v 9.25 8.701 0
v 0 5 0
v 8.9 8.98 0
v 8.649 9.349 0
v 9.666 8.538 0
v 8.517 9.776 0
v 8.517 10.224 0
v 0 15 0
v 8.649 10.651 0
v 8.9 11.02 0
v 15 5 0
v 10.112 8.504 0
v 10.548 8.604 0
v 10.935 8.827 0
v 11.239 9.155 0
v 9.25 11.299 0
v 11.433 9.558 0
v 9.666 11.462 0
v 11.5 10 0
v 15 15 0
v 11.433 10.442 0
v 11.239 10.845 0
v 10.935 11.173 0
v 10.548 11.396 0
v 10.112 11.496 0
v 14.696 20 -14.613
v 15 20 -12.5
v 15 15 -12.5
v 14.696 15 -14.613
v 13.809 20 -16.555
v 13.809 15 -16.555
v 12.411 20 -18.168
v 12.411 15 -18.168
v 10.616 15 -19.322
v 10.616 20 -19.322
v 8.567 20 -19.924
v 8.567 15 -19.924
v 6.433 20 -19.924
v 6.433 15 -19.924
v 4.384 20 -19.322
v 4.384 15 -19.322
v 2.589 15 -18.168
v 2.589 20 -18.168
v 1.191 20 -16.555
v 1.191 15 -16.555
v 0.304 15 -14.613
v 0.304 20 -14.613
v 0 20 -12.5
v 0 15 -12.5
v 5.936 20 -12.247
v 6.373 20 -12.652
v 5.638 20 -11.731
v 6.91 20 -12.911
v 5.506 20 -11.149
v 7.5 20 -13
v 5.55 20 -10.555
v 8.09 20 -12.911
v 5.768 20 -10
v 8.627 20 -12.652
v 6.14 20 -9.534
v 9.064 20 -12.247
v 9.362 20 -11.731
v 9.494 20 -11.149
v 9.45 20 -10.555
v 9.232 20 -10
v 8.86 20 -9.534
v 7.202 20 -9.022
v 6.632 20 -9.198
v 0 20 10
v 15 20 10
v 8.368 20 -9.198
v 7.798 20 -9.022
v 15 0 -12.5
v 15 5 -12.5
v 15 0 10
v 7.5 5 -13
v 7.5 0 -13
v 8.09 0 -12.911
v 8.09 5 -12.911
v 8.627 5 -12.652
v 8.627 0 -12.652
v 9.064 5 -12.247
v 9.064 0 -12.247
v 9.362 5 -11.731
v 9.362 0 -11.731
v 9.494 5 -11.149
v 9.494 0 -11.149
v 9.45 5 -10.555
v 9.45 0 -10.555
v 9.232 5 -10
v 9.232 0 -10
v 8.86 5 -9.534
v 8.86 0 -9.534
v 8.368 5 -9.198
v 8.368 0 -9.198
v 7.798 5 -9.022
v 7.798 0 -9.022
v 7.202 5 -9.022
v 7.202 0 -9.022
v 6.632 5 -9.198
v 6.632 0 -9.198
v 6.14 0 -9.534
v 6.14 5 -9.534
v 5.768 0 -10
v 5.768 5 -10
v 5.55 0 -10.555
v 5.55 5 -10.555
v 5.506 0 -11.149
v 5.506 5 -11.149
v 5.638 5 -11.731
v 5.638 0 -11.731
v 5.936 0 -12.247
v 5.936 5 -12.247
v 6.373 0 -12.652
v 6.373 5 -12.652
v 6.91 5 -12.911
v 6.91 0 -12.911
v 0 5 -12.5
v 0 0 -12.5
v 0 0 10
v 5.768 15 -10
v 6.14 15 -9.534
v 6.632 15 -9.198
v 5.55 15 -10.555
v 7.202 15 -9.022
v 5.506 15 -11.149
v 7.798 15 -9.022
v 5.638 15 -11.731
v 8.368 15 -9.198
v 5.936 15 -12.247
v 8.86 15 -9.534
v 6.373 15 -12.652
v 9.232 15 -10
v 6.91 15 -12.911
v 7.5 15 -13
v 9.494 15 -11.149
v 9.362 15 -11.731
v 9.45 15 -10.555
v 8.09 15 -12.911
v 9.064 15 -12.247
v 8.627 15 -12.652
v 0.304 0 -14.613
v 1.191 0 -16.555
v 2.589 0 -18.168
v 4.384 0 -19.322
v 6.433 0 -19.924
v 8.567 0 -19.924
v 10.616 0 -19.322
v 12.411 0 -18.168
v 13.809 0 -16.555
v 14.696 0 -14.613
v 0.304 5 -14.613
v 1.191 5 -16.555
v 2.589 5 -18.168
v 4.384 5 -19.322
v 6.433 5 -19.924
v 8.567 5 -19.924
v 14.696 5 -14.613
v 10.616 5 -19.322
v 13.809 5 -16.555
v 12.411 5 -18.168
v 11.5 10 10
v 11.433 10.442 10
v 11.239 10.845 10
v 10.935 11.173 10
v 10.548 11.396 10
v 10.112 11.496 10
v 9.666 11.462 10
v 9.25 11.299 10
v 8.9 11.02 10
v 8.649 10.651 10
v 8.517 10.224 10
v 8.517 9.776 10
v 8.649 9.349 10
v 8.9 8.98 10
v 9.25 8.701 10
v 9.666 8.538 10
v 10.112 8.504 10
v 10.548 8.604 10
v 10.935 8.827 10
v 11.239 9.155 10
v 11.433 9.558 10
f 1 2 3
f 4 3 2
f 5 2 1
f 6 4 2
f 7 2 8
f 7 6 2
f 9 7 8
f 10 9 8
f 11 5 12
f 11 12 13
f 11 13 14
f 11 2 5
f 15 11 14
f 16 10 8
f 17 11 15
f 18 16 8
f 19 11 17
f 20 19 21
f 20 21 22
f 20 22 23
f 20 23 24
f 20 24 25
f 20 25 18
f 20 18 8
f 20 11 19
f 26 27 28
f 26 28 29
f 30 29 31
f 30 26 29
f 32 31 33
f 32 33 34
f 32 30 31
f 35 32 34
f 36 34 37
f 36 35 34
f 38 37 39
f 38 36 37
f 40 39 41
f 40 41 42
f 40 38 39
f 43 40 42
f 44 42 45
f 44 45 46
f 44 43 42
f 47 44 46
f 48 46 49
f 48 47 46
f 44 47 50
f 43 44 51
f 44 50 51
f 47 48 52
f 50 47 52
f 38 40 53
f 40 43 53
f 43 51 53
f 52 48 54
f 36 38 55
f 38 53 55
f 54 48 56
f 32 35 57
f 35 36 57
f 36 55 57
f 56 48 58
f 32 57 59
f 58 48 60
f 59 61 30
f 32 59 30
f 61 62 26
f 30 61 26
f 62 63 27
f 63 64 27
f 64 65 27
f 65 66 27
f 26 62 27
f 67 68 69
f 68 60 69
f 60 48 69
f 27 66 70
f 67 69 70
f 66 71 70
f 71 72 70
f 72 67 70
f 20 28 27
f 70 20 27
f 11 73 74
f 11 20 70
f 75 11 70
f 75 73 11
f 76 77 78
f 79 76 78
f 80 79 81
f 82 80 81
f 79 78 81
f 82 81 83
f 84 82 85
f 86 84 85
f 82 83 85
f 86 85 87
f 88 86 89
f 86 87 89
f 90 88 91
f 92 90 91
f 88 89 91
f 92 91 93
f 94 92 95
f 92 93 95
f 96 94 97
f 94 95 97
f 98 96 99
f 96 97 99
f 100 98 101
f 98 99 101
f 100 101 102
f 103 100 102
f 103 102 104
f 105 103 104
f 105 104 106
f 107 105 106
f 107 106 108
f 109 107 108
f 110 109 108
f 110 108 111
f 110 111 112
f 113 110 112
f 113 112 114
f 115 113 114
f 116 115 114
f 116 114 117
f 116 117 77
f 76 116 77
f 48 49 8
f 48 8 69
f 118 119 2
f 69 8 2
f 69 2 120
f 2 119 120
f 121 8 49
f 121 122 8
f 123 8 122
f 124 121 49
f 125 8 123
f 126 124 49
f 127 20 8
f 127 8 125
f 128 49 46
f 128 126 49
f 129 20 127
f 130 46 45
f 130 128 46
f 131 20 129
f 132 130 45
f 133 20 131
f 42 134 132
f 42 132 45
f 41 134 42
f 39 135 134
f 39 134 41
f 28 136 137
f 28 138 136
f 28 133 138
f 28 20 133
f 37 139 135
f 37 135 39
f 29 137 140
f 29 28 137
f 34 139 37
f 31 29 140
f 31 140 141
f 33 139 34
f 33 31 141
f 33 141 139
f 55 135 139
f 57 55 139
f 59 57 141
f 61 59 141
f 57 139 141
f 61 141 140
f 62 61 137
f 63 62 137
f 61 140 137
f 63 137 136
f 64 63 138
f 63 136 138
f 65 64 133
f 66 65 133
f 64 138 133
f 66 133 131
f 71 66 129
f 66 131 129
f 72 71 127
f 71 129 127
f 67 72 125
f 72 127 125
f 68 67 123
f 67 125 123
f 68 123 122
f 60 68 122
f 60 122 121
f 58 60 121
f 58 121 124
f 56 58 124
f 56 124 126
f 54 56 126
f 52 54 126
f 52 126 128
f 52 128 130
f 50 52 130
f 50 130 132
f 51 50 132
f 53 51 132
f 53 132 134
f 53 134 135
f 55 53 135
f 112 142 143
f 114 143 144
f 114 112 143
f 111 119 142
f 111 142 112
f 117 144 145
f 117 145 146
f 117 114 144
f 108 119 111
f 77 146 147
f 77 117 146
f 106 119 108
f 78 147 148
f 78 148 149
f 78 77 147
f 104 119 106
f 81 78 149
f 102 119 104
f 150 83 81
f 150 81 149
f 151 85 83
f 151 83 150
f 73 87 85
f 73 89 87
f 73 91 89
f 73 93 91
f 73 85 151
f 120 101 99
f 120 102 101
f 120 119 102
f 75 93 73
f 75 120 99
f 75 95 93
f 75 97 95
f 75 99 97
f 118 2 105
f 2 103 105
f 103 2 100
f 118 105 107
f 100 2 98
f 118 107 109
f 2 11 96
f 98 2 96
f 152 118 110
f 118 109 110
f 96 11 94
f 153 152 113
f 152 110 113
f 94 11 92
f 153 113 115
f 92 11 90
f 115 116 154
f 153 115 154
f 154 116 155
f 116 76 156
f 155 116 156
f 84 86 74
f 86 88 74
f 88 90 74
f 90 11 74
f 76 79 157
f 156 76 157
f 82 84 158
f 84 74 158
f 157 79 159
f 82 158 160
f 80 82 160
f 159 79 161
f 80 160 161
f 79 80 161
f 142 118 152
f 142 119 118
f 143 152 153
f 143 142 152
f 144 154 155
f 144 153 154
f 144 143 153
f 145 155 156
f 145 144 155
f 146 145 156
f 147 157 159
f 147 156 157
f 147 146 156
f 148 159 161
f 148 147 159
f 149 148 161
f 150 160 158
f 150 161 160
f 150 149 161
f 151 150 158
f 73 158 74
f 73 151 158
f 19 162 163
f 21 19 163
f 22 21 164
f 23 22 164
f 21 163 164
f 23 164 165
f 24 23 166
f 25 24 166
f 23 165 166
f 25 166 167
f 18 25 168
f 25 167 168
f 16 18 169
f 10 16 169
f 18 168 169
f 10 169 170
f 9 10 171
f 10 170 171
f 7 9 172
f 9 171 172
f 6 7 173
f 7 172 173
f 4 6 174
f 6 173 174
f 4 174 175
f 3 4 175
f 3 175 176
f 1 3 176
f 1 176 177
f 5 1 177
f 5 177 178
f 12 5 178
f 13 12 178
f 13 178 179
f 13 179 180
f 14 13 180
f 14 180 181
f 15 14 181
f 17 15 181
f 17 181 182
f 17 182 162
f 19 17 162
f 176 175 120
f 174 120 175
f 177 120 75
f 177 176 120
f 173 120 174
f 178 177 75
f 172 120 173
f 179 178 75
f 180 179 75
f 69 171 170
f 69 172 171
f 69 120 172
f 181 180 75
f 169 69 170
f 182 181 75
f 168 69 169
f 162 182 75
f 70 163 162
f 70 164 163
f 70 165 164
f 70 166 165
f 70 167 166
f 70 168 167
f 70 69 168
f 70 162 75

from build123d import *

# Parameters (mm, degrees)
SKETCH_1_W          = 15
SKETCH_1_H          = 20
EXTRUDE_1_DEPTH     = 10
SKETCH_2_W          = 15
SKETCH_2_H          = 20
SKETCH_2_R          = 2
EXTRUDE_2_DEPTH     = 20
SKETCH_3_W          = 20
SKETCH_3_H          = 10
CUT_EXTRUDE_1_DEPTH = 33.015621187
FILLET_1_RADIUS     = 7.5
FILLET_1_LENGTH     = 5
FILLET_2_RADIUS     = 7.5
FILLET_2_LENGTH     = 5
SKETCH_4_R          = 1.5
CUT_EXTRUDE_2_DEPTH = 40.05124838


with BuildPart() as part:
    # 草图1 → 凸台-拉伸1 (new body)
    with BuildSketch(Plane.XY):
        with Locations((7.5, 10)):
            Rectangle(SKETCH_1_W, SKETCH_1_H)
    extrude(amount=EXTRUDE_1_DEPTH)

    # 草图2 → 凸台-拉伸2 (add)
    with BuildSketch(Plane.XZ):
        with Locations((7.5, -10)):
            Rectangle(SKETCH_2_W, SKETCH_2_H)
        with Locations(Location((7.5, -11, 0), (0, 0, 270))):
            Circle(SKETCH_2_R, mode=Mode.SUBTRACT)
    extrude(amount=-EXTRUDE_2_DEPTH)

    # 草图3 → 切除-拉伸1 (cut, through all)
    with BuildSketch(Plane(origin=(15, 0, 0), x_dir=(0, 0, -1), z_dir=(1, 0, 0))):
        with Locations((10, 10)):
            Rectangle(SKETCH_3_W, SKETCH_3_H)
    extrude(amount=-CUT_EXTRUDE_1_DEPTH, mode=Mode.SUBTRACT)

    # 圆角1: full round fillet: the end face becomes a half cylinder, R = half its width
    fillet_1_face = Plane((7.5, 17.5, -20), x_dir=(0, 1, 0), z_dir=(0, 0, -1))  # on the end face: x along it, z out of the body
    fillet_1_slab = fillet_1_face.offset(-FILLET_1_RADIUS / 2) * Box(FILLET_1_LENGTH, 2 * FILLET_1_RADIUS, FILLET_1_RADIUS, mode=Mode.PRIVATE)  # the body's end, R deep
    fillet_1_round = Plane((7.5, 17.5, -12.5), x_dir=(0, 0, -1), z_dir=(0, 1, 0)) * Cylinder(FILLET_1_RADIUS, FILLET_1_LENGTH, mode=Mode.PRIVATE)  # its axis R under the face
    add(fillet_1_slab - fillet_1_round, mode=Mode.SUBTRACT)

    # 圆角2: full round fillet: the end face becomes a half cylinder, R = half its width
    fillet_2_face = Plane((7.5, 2.5, -20), x_dir=(0, -1, 0), z_dir=(0, 0, -1))  # on the end face: x along it, z out of the body
    fillet_2_slab = fillet_2_face.offset(-FILLET_2_RADIUS / 2) * Box(FILLET_2_LENGTH, 2 * FILLET_2_RADIUS, FILLET_2_RADIUS, mode=Mode.PRIVATE)  # the body's end, R deep
    fillet_2_round = Plane((7.5, 2.5, -12.5), x_dir=(0, 0, -1), z_dir=(0, -1, 0)) * Cylinder(FILLET_2_RADIUS, FILLET_2_LENGTH, mode=Mode.PRIVATE)  # its axis R under the face
    add(fillet_2_slab - fillet_2_round, mode=Mode.SUBTRACT)

    # 草图4 → 切除-拉伸2 (cut, through all)
    with BuildSketch(Plane.XY.offset(10)):
        with Locations((10, 10)):
            Circle(SKETCH_4_R)
    extrude(amount=-CUT_EXTRUDE_2_DEPTH, mode=Mode.SUBTRACT)


solid = part.part
